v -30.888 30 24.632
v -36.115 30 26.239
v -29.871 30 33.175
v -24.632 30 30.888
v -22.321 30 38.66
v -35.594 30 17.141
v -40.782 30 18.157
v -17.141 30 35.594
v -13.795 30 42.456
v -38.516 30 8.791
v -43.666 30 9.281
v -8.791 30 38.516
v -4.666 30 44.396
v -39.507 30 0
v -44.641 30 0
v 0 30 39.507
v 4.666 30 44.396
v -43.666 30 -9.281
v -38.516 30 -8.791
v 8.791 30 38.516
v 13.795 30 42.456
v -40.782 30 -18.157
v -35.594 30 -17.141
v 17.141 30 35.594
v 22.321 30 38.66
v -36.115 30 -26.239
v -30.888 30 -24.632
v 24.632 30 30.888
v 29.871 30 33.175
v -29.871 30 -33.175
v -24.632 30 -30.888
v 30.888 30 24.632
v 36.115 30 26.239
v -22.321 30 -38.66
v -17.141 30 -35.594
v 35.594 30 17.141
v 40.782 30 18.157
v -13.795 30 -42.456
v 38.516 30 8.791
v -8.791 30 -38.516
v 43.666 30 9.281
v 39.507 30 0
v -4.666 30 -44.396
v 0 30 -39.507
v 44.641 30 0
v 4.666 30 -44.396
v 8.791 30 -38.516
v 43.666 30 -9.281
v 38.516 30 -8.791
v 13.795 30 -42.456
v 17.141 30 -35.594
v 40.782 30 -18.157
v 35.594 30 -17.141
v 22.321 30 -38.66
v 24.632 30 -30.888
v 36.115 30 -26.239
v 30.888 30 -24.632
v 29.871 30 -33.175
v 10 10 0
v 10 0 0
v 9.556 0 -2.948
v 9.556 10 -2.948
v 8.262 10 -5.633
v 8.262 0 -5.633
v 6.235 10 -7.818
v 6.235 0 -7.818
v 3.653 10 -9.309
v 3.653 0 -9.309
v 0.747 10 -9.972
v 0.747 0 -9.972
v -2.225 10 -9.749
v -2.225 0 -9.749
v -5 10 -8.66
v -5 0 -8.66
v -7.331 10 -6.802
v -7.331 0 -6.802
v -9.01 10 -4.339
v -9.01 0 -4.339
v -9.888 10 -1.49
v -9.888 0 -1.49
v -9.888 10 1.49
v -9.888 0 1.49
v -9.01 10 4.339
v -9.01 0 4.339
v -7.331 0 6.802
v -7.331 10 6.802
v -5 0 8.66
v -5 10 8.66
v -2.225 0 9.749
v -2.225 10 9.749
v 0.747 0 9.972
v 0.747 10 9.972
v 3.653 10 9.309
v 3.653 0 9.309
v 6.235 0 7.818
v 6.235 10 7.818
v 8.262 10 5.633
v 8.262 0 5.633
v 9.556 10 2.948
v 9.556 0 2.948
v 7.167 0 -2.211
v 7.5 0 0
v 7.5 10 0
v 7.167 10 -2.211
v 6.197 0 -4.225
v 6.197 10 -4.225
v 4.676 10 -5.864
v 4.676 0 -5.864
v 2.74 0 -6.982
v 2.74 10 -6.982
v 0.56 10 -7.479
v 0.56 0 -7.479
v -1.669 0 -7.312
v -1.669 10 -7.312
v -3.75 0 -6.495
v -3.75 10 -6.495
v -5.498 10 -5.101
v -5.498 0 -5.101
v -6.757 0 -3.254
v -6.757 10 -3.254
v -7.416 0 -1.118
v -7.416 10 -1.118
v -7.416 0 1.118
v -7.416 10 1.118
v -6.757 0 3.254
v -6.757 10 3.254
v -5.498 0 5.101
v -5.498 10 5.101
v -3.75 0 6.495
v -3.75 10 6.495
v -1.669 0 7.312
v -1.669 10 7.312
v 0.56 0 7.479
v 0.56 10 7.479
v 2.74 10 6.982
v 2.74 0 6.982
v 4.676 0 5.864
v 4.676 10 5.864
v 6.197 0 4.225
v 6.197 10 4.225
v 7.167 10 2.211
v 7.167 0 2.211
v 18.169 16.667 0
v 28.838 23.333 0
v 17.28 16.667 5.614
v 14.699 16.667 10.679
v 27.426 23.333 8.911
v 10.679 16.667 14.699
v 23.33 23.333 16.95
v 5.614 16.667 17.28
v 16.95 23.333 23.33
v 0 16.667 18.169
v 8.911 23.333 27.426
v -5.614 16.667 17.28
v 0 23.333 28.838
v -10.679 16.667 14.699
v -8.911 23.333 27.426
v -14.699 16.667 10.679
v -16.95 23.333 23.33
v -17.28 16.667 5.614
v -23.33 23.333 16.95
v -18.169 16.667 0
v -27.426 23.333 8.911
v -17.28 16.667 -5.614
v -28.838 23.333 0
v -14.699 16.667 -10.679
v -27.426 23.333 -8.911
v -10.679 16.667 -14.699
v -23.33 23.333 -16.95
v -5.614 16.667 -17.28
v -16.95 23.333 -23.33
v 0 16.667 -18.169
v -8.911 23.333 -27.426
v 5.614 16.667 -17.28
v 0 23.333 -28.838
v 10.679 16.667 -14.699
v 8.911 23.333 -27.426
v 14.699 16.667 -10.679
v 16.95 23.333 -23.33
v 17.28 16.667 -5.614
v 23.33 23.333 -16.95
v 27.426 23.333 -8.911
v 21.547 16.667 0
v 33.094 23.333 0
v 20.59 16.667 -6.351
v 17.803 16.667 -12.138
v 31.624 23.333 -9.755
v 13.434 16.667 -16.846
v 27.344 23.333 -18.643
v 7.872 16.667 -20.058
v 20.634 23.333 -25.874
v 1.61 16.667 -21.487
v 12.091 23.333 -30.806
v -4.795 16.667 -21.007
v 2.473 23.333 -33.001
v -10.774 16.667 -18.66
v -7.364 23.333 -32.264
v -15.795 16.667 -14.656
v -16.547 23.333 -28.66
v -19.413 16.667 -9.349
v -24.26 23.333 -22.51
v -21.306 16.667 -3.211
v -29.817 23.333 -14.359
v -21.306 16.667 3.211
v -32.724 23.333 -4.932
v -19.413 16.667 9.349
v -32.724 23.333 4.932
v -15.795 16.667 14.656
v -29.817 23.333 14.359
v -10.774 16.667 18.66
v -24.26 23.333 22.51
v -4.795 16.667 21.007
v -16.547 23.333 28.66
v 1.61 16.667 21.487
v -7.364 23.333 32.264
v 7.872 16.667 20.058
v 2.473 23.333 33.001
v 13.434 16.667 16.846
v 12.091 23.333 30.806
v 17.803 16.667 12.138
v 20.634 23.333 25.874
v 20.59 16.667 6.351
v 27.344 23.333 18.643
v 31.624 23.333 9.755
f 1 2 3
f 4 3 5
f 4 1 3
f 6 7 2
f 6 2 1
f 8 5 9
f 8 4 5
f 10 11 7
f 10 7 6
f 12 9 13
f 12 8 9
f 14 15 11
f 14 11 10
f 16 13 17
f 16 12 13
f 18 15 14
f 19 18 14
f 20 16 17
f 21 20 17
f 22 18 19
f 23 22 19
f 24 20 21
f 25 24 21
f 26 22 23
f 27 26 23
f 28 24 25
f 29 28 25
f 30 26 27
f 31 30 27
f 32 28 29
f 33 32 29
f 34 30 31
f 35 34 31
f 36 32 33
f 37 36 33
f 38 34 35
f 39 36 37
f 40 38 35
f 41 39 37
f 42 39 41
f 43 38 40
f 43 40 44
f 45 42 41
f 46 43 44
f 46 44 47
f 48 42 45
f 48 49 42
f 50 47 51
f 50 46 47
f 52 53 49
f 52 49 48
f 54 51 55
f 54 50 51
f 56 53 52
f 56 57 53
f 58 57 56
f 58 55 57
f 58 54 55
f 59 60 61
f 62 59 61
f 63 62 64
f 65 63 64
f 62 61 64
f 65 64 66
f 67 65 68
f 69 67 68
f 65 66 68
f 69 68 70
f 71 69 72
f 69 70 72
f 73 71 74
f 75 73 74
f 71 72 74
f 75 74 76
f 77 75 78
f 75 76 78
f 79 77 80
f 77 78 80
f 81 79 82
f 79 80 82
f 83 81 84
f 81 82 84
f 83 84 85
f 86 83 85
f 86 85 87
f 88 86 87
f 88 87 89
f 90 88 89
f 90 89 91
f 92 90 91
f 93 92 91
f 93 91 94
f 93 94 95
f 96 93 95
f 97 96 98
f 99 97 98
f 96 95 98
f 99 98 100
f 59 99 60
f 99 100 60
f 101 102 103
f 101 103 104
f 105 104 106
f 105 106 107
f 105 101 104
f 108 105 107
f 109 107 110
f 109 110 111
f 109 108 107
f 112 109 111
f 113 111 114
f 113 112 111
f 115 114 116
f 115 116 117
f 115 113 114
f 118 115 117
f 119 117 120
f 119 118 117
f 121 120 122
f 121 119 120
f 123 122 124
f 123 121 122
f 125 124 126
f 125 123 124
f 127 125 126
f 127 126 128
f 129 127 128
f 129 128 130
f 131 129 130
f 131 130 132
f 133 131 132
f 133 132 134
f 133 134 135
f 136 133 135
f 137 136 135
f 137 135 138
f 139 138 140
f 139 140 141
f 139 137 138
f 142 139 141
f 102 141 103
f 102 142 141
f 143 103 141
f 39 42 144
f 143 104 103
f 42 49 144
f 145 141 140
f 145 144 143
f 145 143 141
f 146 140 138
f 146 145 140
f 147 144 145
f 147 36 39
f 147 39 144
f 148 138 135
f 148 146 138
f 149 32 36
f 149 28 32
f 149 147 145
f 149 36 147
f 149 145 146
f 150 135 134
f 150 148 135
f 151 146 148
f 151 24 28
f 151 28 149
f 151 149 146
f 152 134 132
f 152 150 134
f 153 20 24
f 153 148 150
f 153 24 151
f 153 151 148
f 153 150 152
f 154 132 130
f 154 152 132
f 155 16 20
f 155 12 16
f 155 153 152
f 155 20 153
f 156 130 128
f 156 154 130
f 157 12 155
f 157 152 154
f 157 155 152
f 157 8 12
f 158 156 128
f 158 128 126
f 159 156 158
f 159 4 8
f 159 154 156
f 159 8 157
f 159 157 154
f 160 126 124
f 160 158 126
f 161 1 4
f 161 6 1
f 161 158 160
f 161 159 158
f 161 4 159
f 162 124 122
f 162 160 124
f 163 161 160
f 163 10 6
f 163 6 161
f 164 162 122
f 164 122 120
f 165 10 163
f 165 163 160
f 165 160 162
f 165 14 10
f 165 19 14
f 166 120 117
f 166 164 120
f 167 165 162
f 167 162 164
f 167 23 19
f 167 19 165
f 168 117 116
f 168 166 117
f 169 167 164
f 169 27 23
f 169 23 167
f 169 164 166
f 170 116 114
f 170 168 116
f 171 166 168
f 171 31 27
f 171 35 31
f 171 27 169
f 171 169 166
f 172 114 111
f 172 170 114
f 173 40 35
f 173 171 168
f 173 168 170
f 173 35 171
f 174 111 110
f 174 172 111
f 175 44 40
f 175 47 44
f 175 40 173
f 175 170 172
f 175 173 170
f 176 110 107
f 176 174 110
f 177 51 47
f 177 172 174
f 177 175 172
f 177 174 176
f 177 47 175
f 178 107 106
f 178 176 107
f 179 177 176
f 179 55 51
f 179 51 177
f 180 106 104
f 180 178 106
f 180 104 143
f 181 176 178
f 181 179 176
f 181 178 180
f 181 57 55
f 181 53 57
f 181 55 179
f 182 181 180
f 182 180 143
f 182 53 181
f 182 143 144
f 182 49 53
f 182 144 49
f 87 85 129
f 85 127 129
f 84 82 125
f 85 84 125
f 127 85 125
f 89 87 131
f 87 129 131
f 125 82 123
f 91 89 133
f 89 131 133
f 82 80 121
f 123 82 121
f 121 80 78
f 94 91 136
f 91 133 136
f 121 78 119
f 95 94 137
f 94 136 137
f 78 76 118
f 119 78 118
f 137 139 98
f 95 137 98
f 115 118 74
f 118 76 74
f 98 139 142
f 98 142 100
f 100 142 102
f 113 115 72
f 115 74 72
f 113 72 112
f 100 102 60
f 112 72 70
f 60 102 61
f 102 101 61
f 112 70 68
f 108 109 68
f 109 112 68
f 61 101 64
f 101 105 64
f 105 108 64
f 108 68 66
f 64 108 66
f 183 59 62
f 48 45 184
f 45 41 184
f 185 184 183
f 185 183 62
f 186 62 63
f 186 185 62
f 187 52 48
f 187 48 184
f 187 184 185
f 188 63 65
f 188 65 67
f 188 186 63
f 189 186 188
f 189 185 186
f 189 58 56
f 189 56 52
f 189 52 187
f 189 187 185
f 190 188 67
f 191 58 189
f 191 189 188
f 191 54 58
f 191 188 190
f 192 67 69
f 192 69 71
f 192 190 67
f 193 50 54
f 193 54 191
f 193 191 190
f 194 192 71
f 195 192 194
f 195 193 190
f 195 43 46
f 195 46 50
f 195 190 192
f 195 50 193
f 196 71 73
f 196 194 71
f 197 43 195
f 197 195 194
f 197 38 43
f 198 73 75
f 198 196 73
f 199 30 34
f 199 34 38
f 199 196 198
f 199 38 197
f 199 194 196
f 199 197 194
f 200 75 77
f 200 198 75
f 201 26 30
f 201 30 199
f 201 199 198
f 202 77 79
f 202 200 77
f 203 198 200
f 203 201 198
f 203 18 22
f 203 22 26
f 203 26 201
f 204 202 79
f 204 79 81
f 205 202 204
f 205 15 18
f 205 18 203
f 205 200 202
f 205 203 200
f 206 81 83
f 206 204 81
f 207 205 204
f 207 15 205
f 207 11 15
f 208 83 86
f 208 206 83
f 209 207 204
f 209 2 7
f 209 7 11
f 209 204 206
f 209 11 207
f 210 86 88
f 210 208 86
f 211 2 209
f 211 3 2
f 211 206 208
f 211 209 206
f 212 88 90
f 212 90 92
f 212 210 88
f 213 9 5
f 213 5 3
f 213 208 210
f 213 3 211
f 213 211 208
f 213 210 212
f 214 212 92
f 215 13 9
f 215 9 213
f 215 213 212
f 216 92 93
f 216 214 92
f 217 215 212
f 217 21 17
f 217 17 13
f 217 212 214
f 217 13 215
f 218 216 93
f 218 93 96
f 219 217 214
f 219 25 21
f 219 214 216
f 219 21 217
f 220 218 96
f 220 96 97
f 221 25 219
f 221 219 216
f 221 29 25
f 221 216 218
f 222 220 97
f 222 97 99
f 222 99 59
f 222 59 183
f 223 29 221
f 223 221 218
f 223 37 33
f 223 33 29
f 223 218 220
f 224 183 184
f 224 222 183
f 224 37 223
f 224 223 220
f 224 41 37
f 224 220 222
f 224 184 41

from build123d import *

# Parameters (mm, degrees)
SKETCH1_R           = 10
SKETCH1_R_2         = 7.5
BOSS_EXTRUDE1_DEPTH = 10
SKETCH6_R           = 10
BOSS_EXTRUDE3_DEPTH = 20
BOSS_EXTRUDE3_TAPER = -60
SKETCH8_R           = 7.5
CUT_EXTRUDE3_DEPTH  = 20
CUT_EXTRUDE3_TAPER  = -58


with BuildPart() as part:
    # Sketch1 → Boss-Extrude1 (new body)
    with BuildSketch(Plane(origin=(0, 0, 0), x_dir=(1, 0, 0), z_dir=(0, 1, 0))):
        Circle(SKETCH1_R)
        Circle(SKETCH1_R_2, mode=Mode.SUBTRACT)
    extrude(amount=BOSS_EXTRUDE1_DEPTH)

    # Sketch6 → Boss-Extrude3 (add)
    with BuildSketch(Plane(origin=(0, 10, 0), x_dir=(1, 0, 0), z_dir=(0, 1, 0))):
        Circle(SKETCH6_R)
    extrude(amount=BOSS_EXTRUDE3_DEPTH, taper=BOSS_EXTRUDE3_TAPER)

    # Sketch8 → Cut-Extrude3 (cut)
    with BuildSketch(Plane.XZ.offset(-10)):
        Circle(SKETCH8_R)
    extrude(amount=-CUT_EXTRUDE3_DEPTH, taper=CUT_EXTRUDE3_TAPER, mode=Mode.SUBTRACT)


solid = part.part
